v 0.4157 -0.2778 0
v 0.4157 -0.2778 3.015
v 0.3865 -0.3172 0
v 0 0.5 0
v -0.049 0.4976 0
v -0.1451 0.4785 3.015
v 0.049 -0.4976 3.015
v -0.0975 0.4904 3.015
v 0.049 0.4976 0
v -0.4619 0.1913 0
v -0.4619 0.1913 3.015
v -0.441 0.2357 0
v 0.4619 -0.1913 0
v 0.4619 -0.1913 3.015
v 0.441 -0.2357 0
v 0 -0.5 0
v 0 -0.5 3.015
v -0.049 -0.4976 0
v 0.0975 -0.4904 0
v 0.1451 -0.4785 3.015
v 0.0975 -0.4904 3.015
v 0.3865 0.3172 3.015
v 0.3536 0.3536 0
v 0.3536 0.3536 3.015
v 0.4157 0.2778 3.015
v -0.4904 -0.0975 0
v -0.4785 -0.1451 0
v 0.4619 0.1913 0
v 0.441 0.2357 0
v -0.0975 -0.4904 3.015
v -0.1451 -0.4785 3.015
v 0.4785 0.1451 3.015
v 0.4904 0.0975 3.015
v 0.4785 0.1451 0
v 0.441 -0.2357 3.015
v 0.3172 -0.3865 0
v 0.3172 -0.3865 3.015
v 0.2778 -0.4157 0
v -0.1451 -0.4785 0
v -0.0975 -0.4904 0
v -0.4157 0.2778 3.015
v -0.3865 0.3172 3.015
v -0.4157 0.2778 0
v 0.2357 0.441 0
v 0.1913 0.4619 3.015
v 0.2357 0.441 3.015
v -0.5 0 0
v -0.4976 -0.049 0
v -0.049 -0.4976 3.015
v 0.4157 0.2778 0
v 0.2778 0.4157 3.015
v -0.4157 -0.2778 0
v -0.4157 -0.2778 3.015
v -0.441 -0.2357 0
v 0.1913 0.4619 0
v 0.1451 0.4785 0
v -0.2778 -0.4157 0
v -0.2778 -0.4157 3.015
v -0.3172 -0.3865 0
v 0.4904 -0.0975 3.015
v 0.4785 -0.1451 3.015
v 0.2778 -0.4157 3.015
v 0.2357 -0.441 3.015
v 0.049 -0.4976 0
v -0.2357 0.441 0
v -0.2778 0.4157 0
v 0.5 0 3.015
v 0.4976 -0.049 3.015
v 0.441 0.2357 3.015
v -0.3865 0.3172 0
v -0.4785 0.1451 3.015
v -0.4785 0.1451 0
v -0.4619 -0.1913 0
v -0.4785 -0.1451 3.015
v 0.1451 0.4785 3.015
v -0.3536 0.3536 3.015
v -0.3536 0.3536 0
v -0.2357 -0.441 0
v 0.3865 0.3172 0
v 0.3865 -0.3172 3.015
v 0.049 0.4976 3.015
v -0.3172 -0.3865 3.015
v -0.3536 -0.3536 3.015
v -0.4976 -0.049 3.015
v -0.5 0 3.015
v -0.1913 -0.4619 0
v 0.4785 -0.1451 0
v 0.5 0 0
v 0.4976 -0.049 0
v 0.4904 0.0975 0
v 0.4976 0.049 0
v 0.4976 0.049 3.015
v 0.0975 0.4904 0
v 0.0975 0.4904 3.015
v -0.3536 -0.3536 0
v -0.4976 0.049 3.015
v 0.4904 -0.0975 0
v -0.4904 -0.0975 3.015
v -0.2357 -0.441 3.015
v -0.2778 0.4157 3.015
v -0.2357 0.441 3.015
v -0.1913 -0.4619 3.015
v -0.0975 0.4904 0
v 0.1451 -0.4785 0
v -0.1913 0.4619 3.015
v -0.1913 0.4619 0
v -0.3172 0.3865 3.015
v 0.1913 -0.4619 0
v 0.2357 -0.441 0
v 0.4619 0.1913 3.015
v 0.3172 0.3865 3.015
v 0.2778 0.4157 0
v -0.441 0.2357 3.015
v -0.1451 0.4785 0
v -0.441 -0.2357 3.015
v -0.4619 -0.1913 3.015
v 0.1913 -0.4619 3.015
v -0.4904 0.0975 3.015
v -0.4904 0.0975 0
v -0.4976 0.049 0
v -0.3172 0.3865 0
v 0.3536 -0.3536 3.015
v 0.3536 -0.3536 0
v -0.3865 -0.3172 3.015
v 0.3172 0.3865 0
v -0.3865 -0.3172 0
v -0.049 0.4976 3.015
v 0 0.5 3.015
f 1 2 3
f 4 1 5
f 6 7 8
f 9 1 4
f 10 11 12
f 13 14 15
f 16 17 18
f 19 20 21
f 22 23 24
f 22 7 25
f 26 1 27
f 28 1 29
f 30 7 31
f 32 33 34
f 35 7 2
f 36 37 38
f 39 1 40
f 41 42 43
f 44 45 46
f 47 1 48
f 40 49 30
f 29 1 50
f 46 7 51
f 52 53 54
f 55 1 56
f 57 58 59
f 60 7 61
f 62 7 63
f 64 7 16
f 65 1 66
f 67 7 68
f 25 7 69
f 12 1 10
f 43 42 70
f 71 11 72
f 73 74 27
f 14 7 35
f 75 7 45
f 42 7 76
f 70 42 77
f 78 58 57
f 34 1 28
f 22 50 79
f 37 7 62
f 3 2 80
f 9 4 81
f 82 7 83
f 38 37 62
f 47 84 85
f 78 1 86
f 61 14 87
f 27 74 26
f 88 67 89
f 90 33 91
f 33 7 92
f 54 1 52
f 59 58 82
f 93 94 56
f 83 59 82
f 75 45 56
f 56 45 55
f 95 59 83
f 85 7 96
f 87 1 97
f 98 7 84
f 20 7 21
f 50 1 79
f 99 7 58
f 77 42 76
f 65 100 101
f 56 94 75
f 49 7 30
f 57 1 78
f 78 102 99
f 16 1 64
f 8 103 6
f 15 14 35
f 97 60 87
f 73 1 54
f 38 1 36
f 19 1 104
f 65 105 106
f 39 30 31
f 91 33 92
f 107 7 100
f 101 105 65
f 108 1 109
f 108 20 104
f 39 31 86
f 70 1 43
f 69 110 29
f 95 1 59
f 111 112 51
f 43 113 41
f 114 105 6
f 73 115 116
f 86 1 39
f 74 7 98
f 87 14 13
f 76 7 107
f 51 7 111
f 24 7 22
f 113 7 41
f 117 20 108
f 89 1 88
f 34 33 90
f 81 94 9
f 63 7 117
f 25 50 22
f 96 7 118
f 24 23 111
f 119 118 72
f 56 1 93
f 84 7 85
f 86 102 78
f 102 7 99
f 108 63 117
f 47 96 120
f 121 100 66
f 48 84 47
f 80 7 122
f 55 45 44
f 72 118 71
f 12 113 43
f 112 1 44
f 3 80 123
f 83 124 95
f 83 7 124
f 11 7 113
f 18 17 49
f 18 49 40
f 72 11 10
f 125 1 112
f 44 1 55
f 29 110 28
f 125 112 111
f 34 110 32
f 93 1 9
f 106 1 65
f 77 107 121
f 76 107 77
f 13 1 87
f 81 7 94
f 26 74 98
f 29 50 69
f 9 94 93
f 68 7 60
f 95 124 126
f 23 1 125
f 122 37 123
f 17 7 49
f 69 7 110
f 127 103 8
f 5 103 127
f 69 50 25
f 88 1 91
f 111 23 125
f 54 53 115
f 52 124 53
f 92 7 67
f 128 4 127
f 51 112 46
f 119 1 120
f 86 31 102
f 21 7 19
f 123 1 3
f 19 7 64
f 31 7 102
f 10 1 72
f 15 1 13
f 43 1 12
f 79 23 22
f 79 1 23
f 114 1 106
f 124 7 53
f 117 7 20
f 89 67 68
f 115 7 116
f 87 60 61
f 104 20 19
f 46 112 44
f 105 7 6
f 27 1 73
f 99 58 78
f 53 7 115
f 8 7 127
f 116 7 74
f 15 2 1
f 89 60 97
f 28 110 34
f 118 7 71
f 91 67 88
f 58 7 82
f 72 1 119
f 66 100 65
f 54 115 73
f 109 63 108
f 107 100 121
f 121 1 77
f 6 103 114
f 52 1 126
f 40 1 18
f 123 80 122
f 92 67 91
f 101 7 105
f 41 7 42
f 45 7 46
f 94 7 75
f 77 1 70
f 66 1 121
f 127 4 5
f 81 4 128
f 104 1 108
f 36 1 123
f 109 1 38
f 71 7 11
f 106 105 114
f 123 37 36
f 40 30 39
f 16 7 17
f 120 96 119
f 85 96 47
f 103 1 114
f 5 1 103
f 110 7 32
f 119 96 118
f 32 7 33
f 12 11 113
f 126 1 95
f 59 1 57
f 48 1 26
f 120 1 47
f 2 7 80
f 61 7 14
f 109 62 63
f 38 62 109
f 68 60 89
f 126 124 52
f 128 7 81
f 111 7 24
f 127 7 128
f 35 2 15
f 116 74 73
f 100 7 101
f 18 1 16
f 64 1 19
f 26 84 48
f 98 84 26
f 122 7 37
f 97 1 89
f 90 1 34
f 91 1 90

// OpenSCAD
// Regression test for CGAL convex_hull_3 assertion failure in WebAssembly.
//
// Root cause: WebAssembly does not support fesetround(FE_UPWARD), causing
// CGAL's Interval_nt arithmetic to produce incorrect interval bounds.
// Fix: compile with -DCGAL_ALWAYS_ROUND_TO_NEAREST so CGAL uses
// nextafter() instead of relying on FPU rounding mode.
//
// Without the fix, this triggers:
//   CGAL error: assertion violation!
//   Expression : it != border.end()
//   File       : .../CGAL/convex_hull_3.h
//   Line       : 684

$fn = 64;
hull() {
    cylinder(h = 0.015, d = 1);
    translate([0, 0, 3]) cylinder(h = 0.015, d = 1);
}
